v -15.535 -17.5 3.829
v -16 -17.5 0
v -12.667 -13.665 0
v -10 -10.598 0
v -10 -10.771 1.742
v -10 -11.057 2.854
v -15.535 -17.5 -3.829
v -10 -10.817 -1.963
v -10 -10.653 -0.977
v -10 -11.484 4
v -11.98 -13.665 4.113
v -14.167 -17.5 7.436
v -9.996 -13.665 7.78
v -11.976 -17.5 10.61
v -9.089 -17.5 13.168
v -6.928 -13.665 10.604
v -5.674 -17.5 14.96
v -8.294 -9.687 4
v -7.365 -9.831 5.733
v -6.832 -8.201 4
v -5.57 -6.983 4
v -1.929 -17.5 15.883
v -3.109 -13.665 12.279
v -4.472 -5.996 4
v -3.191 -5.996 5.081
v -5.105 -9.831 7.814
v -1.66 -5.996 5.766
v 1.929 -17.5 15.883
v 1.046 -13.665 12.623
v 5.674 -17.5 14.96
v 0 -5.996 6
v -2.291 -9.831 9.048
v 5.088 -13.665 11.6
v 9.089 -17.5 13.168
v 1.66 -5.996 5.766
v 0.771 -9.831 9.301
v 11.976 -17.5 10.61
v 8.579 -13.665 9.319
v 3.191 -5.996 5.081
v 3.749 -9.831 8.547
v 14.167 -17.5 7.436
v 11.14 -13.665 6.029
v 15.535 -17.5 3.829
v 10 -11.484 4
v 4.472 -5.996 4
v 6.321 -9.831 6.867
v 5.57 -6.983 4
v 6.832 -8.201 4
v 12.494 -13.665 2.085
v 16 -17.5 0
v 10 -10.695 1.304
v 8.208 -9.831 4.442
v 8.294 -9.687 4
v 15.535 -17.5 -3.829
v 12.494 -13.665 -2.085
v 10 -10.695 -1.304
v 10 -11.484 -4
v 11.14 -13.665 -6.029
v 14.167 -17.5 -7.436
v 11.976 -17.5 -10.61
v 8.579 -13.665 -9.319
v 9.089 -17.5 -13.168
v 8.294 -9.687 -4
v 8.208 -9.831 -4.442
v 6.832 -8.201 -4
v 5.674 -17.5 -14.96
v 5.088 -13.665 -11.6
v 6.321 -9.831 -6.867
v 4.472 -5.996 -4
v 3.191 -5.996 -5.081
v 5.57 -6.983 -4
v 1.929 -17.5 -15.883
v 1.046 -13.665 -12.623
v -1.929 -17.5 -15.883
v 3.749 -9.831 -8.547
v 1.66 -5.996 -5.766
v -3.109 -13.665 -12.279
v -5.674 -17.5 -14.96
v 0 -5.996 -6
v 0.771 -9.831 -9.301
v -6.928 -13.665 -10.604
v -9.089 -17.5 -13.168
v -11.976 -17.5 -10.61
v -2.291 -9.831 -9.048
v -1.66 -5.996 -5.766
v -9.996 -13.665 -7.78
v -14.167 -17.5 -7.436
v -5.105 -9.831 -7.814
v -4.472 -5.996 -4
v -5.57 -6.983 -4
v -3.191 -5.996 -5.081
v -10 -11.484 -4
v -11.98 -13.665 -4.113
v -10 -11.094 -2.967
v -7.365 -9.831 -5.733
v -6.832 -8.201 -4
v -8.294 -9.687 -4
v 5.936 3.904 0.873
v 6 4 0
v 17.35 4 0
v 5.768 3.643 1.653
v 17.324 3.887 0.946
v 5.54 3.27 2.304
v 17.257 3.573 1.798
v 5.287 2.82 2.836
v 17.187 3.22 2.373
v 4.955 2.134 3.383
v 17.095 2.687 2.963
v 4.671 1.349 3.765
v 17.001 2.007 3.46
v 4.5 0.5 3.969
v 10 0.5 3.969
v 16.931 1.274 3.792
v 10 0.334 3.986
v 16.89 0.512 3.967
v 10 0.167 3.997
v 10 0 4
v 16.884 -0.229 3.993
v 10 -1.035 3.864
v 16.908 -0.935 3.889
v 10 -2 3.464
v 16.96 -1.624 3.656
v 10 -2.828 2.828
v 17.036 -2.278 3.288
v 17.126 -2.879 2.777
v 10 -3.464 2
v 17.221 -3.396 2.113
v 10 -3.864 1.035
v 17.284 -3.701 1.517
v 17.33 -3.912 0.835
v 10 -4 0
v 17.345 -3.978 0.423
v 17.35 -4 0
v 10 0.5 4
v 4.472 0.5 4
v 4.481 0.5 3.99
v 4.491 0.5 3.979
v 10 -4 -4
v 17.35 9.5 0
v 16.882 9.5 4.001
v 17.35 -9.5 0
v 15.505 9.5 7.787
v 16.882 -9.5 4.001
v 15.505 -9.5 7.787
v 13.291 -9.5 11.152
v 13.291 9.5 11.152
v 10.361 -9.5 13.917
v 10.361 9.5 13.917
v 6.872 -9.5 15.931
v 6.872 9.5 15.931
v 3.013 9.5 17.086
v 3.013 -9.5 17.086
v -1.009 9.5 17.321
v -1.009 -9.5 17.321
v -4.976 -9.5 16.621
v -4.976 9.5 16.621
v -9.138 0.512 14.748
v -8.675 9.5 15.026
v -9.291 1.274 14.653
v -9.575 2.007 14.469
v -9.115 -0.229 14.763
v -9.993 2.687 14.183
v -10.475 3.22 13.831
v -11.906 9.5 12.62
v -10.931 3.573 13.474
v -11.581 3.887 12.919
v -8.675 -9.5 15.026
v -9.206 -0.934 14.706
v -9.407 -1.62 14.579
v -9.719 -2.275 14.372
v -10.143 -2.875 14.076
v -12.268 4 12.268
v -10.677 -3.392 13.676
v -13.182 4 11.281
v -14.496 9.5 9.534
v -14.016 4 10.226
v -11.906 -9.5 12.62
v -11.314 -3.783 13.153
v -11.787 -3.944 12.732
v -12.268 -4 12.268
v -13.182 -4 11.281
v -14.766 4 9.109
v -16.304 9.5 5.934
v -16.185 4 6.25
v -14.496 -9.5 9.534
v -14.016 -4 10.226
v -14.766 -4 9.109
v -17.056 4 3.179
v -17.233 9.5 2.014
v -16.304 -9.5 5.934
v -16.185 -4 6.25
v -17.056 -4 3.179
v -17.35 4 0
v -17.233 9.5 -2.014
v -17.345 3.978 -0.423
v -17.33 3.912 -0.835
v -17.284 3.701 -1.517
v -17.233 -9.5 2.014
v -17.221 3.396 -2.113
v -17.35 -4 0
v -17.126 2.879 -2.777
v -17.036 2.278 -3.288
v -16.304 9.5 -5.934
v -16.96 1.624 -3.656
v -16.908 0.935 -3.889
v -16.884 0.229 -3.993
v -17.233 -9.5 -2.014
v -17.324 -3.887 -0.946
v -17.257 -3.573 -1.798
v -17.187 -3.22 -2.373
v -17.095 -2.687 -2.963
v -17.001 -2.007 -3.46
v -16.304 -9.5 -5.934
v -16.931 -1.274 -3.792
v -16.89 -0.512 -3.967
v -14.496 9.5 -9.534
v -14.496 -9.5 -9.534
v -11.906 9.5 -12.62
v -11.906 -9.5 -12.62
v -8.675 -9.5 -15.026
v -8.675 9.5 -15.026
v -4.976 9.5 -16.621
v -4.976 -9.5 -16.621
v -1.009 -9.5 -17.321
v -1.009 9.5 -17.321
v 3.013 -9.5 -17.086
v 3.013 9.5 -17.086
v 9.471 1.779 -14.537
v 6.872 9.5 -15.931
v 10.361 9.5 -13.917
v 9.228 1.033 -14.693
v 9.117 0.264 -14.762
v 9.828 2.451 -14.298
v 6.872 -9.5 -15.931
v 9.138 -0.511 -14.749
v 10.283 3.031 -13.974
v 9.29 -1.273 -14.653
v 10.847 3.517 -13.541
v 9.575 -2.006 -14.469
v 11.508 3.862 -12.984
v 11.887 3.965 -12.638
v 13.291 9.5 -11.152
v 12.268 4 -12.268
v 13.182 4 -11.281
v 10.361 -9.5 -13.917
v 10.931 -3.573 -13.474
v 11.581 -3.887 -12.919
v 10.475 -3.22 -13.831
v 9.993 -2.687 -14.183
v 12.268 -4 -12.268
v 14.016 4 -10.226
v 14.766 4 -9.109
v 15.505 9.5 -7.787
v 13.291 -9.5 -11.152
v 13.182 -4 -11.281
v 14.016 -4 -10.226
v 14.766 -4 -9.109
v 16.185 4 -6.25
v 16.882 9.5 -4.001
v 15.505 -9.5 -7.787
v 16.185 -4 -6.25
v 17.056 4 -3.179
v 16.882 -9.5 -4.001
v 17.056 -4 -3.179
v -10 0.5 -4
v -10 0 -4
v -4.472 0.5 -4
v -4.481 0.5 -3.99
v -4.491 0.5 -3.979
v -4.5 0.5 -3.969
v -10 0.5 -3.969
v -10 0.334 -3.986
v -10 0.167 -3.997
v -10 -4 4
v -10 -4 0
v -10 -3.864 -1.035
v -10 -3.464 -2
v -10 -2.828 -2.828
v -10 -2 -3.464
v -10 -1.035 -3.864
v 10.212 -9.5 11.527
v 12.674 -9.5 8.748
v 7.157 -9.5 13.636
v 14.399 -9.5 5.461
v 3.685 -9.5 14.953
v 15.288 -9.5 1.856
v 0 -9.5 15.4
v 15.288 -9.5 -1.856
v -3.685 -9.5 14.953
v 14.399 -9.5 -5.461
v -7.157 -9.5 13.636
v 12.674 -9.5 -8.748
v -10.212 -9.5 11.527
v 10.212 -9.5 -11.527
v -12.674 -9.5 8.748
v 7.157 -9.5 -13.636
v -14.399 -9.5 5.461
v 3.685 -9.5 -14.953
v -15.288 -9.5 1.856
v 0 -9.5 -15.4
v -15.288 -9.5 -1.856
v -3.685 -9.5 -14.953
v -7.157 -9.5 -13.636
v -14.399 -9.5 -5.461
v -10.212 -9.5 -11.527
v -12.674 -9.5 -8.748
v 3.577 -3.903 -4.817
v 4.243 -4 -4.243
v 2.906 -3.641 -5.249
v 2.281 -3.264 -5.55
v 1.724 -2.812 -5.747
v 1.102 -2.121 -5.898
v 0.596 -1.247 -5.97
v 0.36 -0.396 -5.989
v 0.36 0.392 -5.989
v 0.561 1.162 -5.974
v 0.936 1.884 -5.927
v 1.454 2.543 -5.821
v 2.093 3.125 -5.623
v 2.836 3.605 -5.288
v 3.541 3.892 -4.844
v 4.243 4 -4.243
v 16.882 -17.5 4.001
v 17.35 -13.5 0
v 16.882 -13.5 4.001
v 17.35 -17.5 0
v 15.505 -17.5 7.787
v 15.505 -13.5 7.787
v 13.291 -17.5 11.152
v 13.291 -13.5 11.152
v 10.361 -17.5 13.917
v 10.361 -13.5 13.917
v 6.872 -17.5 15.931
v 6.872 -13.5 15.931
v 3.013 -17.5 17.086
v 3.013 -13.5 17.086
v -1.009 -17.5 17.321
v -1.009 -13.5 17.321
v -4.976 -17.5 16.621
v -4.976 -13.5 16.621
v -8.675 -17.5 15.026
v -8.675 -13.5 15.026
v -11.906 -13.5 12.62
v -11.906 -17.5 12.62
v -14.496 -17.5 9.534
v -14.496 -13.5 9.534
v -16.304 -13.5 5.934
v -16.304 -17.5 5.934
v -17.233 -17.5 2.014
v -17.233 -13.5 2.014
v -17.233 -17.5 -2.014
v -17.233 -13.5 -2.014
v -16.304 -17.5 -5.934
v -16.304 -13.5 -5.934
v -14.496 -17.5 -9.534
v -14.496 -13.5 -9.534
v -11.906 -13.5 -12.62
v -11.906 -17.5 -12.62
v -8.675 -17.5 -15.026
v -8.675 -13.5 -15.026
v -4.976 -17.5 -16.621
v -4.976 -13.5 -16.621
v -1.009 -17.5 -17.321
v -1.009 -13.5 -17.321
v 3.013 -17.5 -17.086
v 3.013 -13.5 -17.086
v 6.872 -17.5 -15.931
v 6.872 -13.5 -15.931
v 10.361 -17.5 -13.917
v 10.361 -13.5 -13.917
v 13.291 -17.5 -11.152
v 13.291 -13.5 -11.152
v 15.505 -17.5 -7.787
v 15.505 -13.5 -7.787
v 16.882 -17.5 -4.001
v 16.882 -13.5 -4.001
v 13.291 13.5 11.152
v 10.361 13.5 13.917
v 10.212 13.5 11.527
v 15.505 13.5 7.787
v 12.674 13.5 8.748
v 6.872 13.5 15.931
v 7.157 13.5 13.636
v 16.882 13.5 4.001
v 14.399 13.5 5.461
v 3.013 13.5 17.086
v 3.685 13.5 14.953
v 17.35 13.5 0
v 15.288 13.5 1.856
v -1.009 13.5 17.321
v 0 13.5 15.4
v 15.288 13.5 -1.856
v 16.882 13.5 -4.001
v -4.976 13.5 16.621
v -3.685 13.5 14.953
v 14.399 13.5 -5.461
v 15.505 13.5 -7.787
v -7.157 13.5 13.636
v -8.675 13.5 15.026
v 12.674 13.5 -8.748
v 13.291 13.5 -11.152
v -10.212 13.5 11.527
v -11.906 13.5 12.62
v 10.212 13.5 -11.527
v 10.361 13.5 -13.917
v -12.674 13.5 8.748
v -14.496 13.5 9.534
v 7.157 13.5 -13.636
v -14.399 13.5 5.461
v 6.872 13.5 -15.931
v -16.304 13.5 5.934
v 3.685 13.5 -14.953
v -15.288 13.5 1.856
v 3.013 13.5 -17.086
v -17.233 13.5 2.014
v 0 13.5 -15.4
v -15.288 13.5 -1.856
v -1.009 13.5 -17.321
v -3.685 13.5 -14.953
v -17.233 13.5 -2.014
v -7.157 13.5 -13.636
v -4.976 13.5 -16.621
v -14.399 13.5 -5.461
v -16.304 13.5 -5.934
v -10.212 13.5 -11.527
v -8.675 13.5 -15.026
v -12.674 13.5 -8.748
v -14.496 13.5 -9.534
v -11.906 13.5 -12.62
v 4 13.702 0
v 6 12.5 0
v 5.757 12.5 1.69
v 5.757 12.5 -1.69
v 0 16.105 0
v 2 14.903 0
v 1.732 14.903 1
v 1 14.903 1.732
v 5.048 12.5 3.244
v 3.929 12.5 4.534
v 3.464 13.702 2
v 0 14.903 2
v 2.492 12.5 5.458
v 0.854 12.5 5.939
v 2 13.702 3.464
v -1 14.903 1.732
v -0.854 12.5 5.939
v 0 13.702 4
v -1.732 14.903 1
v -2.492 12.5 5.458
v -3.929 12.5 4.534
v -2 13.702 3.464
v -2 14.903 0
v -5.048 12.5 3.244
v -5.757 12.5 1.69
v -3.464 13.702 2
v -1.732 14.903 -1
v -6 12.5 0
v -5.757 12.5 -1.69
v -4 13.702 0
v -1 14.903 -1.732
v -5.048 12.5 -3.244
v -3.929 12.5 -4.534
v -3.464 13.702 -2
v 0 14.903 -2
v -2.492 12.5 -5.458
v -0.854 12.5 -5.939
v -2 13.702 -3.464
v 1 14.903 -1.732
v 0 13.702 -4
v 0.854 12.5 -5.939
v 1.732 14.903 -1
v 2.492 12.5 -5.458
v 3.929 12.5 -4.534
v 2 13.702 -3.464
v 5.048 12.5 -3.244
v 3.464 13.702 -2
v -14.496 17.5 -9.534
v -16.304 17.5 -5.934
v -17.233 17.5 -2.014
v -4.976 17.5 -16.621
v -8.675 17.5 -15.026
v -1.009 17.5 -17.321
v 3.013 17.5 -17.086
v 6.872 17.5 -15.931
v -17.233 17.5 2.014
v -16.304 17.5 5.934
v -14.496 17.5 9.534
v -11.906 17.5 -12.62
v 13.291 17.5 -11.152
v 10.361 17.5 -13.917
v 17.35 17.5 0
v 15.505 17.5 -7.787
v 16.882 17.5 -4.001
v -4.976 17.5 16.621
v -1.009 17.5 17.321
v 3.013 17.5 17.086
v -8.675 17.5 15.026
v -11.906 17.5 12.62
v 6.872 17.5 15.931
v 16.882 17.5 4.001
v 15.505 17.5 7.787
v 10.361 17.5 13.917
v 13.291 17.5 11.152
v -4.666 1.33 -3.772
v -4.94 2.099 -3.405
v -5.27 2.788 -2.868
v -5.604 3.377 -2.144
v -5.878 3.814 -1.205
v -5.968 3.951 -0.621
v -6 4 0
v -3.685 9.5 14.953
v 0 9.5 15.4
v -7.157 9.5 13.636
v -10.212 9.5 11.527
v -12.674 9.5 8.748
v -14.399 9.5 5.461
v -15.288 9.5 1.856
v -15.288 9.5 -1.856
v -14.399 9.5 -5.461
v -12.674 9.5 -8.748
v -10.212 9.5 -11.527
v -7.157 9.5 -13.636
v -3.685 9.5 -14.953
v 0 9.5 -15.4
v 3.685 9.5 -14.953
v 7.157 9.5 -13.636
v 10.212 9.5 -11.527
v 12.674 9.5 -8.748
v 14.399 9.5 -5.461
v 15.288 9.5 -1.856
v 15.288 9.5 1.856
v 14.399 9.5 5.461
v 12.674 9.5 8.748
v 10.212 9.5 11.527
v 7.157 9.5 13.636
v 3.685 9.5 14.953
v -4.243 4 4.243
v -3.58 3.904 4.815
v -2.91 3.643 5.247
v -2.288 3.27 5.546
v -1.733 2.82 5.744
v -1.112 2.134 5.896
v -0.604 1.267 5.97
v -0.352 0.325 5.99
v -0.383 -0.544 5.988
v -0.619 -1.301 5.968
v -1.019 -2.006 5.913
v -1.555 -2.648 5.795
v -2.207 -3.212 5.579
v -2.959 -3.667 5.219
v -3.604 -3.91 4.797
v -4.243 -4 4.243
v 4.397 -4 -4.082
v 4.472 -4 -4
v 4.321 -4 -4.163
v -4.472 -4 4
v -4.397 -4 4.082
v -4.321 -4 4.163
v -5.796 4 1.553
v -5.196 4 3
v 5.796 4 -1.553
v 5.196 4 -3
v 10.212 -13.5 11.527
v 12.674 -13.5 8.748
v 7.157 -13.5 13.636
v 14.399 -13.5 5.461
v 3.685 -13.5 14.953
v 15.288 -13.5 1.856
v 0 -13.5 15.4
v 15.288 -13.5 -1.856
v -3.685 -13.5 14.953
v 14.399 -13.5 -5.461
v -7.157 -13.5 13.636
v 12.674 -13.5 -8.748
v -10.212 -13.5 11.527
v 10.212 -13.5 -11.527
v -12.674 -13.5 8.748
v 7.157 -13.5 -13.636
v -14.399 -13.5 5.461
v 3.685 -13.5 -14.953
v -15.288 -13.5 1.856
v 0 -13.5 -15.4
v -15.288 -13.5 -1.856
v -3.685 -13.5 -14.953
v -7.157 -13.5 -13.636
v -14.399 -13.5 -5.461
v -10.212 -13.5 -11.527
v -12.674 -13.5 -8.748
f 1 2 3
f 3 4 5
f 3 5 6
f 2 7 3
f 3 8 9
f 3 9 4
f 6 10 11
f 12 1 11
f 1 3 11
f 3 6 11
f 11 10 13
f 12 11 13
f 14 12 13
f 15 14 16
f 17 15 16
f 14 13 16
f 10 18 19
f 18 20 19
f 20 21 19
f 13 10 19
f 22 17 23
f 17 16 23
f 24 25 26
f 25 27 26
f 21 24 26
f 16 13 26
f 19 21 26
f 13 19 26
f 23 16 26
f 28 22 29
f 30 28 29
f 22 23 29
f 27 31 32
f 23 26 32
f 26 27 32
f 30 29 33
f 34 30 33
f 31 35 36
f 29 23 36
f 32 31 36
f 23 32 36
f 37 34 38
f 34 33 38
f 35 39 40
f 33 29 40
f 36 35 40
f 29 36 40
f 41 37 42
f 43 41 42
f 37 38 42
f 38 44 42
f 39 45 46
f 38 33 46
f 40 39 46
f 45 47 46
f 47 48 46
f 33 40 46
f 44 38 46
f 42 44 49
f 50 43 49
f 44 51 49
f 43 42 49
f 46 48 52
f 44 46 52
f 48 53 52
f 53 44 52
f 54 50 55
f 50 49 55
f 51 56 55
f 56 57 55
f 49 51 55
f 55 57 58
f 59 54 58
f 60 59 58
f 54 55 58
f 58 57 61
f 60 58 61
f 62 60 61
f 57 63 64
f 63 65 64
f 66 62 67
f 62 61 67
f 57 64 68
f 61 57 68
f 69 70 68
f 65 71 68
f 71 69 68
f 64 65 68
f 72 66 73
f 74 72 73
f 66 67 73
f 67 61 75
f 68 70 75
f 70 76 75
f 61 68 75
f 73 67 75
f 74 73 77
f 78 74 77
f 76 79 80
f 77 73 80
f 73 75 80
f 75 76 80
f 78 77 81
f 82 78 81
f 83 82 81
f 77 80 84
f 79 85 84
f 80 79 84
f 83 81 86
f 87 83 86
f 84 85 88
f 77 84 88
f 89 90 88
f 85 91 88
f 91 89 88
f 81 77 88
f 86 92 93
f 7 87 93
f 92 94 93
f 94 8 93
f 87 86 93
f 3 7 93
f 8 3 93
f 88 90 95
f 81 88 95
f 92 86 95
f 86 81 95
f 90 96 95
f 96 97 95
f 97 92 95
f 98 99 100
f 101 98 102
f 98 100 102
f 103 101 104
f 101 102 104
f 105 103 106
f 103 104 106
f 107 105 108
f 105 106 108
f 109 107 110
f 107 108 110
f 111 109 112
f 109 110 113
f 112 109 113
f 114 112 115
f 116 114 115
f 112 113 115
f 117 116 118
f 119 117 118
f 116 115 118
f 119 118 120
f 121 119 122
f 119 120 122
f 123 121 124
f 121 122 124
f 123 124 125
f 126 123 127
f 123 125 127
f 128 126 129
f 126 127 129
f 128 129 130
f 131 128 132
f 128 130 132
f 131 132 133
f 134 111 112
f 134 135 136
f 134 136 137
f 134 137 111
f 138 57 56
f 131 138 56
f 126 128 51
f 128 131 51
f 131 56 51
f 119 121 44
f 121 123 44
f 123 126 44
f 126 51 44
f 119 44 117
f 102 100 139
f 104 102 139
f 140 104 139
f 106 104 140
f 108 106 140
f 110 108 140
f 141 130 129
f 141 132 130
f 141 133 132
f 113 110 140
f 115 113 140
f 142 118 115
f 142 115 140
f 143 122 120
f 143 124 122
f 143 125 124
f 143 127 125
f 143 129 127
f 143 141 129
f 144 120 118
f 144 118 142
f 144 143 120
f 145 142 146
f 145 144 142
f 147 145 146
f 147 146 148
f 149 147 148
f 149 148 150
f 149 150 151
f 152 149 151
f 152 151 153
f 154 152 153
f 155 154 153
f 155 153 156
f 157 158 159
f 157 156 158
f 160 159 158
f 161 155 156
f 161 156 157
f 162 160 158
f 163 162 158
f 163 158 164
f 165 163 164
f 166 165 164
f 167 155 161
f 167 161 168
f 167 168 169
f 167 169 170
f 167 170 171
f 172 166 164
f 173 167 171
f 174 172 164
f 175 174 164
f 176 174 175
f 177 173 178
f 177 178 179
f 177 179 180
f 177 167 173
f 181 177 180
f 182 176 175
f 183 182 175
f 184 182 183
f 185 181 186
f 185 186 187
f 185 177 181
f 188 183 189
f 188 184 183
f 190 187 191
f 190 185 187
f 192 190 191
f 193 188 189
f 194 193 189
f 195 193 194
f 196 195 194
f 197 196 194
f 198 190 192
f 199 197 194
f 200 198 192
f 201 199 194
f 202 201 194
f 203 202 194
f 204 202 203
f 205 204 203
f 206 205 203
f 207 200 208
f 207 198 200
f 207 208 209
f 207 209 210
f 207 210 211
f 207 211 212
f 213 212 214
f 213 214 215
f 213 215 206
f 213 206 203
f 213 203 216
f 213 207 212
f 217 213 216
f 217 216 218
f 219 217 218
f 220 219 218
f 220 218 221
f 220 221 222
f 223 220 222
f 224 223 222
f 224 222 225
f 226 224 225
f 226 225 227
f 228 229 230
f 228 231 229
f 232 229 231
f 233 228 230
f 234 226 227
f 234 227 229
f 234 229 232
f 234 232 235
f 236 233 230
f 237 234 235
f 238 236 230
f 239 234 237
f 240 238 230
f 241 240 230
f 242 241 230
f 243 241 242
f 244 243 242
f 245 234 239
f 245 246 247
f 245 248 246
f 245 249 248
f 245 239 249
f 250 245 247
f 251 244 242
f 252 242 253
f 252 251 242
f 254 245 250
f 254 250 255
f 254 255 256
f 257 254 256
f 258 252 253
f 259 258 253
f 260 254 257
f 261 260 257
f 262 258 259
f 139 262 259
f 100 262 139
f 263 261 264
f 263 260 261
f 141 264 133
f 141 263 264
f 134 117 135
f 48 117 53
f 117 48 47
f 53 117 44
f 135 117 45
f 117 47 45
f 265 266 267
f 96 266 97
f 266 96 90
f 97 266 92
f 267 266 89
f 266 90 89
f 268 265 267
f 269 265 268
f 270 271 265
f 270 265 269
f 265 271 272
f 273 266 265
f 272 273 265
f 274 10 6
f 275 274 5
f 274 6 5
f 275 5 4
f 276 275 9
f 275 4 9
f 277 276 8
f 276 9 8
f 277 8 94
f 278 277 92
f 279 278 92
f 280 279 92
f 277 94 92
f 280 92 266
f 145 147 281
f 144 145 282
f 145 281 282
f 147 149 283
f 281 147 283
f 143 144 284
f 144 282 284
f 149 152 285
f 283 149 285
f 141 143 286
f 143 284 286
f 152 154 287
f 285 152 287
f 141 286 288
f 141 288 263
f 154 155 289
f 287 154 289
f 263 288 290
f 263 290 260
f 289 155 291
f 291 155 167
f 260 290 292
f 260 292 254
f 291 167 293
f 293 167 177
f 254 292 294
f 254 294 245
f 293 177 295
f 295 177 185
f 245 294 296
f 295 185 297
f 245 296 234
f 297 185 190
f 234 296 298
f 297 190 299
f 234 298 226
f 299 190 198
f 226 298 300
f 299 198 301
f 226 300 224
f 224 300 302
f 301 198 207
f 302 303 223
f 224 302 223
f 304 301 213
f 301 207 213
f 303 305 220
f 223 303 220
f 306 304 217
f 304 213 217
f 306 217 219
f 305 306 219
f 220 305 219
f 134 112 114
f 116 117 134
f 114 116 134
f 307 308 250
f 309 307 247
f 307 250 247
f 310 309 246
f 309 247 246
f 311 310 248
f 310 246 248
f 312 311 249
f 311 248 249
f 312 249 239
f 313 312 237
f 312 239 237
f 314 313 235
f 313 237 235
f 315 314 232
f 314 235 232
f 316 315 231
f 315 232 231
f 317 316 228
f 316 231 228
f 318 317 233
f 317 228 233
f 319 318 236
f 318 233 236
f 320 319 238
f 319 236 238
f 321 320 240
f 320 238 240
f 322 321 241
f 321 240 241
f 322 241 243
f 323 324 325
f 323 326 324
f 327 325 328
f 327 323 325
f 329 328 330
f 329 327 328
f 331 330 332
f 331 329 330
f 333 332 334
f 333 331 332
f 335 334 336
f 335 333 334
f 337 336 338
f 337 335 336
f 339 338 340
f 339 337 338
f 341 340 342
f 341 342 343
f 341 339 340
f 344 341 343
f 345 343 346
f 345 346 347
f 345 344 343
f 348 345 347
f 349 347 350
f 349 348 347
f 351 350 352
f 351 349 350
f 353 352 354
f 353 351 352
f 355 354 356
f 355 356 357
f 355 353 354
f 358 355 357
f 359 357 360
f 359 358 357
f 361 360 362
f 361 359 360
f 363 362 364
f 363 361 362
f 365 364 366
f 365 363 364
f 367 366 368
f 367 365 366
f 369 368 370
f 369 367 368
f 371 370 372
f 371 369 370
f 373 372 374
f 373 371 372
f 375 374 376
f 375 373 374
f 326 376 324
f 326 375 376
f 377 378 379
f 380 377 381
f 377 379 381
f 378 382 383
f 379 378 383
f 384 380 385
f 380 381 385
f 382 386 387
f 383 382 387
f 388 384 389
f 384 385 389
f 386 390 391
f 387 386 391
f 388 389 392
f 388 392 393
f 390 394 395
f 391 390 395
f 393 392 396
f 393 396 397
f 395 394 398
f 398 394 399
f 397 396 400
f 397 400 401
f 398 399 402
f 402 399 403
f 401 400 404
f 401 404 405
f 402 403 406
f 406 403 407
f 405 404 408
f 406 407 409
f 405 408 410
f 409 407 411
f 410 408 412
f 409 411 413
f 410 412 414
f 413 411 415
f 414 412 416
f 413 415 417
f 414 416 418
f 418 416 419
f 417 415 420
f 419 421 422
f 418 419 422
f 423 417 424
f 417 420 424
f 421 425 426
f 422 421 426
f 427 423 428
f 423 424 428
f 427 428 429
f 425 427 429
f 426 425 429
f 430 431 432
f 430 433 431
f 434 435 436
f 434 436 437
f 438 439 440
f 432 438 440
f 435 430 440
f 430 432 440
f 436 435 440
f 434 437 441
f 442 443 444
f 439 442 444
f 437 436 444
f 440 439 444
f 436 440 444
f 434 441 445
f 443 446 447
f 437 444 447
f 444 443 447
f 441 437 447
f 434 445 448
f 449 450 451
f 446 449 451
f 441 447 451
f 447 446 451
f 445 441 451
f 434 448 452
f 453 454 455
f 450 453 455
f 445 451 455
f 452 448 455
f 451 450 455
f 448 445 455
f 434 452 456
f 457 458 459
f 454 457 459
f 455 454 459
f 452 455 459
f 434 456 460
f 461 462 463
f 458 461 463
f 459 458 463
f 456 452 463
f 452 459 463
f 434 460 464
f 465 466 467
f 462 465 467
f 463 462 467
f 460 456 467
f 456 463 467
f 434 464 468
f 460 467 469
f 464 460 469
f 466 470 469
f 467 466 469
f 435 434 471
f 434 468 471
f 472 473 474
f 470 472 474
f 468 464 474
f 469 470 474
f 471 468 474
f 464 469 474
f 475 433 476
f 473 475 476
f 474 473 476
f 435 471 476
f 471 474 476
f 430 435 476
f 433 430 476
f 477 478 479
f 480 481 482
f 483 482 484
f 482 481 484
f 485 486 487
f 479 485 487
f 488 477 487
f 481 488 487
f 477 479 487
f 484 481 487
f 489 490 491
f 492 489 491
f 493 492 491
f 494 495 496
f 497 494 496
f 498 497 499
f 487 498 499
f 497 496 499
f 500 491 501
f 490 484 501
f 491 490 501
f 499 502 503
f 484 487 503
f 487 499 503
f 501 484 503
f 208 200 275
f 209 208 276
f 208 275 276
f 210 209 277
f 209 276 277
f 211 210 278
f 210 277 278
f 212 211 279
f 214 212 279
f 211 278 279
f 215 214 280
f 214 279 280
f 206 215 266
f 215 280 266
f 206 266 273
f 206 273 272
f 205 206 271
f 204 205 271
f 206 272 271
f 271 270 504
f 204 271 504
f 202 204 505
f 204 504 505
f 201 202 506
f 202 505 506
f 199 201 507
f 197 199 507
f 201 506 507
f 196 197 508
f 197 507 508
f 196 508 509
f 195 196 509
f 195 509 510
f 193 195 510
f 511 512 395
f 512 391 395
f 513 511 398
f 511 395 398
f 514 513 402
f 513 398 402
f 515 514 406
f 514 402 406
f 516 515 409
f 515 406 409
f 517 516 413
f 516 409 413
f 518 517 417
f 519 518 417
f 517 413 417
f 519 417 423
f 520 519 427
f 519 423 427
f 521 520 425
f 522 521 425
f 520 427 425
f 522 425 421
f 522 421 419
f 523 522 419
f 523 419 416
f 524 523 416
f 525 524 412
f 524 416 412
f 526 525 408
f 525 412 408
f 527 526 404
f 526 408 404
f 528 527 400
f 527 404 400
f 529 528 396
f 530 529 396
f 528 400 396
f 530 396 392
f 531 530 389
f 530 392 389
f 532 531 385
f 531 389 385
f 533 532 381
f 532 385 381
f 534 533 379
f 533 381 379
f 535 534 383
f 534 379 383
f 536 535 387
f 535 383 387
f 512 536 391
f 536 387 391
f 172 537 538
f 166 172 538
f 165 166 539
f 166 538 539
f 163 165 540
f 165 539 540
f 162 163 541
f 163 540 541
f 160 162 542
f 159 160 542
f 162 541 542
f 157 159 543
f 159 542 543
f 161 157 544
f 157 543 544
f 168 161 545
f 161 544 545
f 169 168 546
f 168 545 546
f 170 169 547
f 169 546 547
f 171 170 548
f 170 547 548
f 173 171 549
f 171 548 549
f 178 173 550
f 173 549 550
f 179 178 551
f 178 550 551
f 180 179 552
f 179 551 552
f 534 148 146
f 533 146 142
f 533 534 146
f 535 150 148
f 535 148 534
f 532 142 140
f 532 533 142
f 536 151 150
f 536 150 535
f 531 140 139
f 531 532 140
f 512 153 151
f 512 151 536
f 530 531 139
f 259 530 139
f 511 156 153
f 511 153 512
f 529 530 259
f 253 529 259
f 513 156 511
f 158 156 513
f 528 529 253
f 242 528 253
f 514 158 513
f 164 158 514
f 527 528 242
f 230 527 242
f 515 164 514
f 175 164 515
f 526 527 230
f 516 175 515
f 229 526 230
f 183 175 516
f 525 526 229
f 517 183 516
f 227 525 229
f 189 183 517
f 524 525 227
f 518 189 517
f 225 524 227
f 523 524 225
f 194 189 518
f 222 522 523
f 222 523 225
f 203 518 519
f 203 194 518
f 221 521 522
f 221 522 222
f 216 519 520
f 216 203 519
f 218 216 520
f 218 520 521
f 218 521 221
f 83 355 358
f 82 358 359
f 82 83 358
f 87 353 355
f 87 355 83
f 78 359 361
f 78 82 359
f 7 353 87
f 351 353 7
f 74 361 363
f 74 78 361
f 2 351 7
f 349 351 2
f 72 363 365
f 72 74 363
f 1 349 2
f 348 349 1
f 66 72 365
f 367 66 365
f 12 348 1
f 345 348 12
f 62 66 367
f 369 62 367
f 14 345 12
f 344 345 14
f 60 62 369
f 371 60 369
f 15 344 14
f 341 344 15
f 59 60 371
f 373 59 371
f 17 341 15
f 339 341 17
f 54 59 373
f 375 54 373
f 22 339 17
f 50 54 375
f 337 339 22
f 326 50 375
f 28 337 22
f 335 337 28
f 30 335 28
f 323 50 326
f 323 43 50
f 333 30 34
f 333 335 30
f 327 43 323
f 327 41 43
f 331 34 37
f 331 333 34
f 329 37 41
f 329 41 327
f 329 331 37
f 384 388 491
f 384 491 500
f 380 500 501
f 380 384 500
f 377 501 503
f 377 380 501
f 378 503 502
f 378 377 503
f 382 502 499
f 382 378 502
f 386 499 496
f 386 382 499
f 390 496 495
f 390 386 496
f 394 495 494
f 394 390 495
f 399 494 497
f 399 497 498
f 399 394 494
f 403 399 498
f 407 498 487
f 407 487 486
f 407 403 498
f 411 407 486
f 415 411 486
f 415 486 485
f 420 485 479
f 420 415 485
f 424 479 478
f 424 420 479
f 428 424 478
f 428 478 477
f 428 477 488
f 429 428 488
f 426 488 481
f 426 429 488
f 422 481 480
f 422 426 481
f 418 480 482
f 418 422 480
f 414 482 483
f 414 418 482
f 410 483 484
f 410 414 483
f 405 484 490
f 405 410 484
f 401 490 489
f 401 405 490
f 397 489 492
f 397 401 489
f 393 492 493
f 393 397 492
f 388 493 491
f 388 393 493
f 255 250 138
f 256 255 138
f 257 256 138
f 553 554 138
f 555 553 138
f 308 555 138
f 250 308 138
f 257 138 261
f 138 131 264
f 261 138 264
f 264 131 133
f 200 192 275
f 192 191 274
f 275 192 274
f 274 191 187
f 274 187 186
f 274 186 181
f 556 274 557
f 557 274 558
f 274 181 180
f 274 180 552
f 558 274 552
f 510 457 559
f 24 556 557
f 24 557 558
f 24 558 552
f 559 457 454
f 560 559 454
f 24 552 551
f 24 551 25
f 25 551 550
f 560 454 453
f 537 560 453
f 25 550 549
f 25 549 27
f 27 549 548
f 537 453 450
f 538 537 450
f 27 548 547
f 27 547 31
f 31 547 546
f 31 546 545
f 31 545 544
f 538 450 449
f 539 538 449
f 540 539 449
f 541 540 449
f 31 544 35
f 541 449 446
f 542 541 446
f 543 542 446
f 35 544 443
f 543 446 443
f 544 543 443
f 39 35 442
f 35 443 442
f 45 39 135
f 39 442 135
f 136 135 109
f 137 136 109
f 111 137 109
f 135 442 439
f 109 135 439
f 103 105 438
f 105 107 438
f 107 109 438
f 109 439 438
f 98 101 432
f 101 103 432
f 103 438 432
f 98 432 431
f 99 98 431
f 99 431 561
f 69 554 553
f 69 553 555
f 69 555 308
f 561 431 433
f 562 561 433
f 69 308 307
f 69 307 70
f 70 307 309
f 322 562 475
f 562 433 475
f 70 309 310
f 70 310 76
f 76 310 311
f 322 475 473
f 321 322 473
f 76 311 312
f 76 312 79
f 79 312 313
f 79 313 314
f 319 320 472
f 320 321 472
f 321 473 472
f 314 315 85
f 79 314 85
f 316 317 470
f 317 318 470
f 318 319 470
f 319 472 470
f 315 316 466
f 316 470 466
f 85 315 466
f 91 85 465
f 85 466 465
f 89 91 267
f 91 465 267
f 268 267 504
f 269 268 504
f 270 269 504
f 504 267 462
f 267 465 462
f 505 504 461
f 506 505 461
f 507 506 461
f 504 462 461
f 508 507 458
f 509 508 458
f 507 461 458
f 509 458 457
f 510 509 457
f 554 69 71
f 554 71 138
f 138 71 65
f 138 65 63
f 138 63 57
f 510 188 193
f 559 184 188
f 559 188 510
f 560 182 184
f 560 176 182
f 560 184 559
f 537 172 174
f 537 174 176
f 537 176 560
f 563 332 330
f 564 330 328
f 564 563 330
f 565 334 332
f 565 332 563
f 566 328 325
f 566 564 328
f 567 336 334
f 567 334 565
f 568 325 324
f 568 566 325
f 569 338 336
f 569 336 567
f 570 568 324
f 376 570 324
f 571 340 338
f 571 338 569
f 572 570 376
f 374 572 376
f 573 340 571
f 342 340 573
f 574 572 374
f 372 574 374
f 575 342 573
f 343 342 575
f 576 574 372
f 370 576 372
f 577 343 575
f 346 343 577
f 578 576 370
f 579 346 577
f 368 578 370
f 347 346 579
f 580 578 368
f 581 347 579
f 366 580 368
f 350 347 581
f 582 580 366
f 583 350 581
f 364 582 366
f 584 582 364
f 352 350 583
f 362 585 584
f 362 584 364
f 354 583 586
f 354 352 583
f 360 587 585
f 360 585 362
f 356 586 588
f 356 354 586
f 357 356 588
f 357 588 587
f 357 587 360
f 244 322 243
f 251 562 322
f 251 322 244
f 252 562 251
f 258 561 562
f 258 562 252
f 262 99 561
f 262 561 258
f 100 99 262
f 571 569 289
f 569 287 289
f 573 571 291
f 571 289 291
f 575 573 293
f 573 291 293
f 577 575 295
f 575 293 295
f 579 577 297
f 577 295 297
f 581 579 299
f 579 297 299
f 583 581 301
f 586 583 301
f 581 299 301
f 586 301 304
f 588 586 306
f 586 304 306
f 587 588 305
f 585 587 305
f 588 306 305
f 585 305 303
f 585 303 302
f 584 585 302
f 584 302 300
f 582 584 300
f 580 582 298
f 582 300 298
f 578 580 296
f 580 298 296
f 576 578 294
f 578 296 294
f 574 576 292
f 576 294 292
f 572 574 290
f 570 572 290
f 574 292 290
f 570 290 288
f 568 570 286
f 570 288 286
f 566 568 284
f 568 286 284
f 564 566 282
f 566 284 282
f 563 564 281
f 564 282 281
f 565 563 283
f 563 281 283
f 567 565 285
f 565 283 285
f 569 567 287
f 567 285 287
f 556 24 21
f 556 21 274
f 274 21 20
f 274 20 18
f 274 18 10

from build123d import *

# Parameters (mm, degrees)
F0_R           = 17.35
F0_R_2         = 16.35
F1_DEPTH       = 17.5
F2_W           = 4
F2_H           = 5
F5_D           = 12
F5_DEPTH       = 30
F5_CSINK_D     = 32
F5_CSINK_ANGLE = 82
F5_TIP         = 3.6051637142
F6_DEPTH       = 18
F7_R           = 4
F8_DEPTH       = 17.5
F10_R          = 4
F11_DEPTH      = 17.5
F13_DEPTH      = 4


with BuildPart() as f1:
    # F0 (on Front) → F1 (new body, symmetric)
    with BuildSketch(Plane.XZ):
        Circle(F0_R)
        Circle(F0_R_2, mode=Mode.SUBTRACT)
        Circle(F0_R_2)
    extrude(amount=F1_DEPTH, both=True)

    # F2 (on Right) → F3 (revolve, cut)
    with BuildSketch(Plane.YZ):
        with Locations((-11.5, 17.9)):
            Rectangle(F2_W, F2_H)
        with Locations((11.5, 17.9)):
            Rectangle(F2_W, F2_H)
    revolve(axis=Axis((0, 0, 0), (0, -1, 0)), mode=Mode.SUBTRACT)

    # F5
    with Locations(Plane.XZ.offset(17.5)):
        with Locations((0, 0)):
            CounterSinkHole(F5_D / 2, F5_CSINK_D / 2, depth=F5_DEPTH, counter_sink_angle=F5_CSINK_ANGLE)
            with Locations((0, 0, -(F5_DEPTH + F5_TIP / 2))):  # 118° drill point
                Cone(0, F5_D / 2, F5_TIP, mode=Mode.SUBTRACT)

    # F4 (on face) → F6 (cut)
    with BuildSketch(Plane.XZ.offset(17.5)):
        with BuildLine():
            ThreePointArc((-4.472135955, -4), (-6, 0), (-4.472135955, 4))
            Line((-4.472135955, 4), (-10, 4))
            Line((-10, 4), (-10, -4))
            Line((-10, -4), (-4.472135955, -4))
        make_face()
        with BuildLine():
            ThreePointArc((4.472135955, 4), (5.6050341538, 2.1409325386), (6, 0))
            ThreePointArc((6, 0), (5.6050341538, -2.1409325386), (4.472135955, -4))
            Line((4.472135955, -4), (10, -4))
            Line((10, -4), (10, 4))
            Line((10, 4), (4.472135955, 4))
        make_face()
    extrude(amount=-F6_DEPTH, mode=Mode.SUBTRACT)

    # F7 (on Right) → F8 (cut, symmetric)
    with BuildSketch(Plane.YZ):
        Circle(F7_R)
    extrude(amount=F8_DEPTH, both=True, mode=Mode.SUBTRACT)

    # F10 (on face) → F11 (cut, symmetric)
    with BuildSketch(Plane(origin=(0, 0, 0), x_dir=(0, 1, 0), z_dir=(0.7071067812, 0, -0.7071067812))):
        Circle(F10_R)
    extrude(amount=F11_DEPTH, both=True, mode=Mode.SUBTRACT)

    # F12 (on Front) → F13 (cut, symmetric)
    with BuildSketch(Plane.XZ):
        with BuildLine():
            Line((-17.35, 0), (0, 0))
            Line((0, 0), (-12.2683026536, 12.2683026536))
            ThreePointArc((-12.2683026536, 12.2683026536), (-13.6092339975, 10.7615635481), (-14.7662347124, 9.1093804629))
            ThreePointArc((-14.7662347124, 9.1093804629), (-16.6915648197, 4.7343599219), (-17.35, 0))
        make_face()
        with BuildLine():
            ThreePointArc((14.7662347124, -9.1093804629), (16.6915648197, -4.7343599219), (17.35, 0))
            Line((17.35, 0), (0, 0))
            Line((0, 0), (12.2683026536, -12.2683026536))
            ThreePointArc((12.2683026536, -12.2683026536), (13.6092339975, -10.7615635481), (14.7662347124, -9.1093804629))
        make_face()
    extrude(amount=F13_DEPTH, both=True, mode=Mode.SUBTRACT)


solid = f1.part
